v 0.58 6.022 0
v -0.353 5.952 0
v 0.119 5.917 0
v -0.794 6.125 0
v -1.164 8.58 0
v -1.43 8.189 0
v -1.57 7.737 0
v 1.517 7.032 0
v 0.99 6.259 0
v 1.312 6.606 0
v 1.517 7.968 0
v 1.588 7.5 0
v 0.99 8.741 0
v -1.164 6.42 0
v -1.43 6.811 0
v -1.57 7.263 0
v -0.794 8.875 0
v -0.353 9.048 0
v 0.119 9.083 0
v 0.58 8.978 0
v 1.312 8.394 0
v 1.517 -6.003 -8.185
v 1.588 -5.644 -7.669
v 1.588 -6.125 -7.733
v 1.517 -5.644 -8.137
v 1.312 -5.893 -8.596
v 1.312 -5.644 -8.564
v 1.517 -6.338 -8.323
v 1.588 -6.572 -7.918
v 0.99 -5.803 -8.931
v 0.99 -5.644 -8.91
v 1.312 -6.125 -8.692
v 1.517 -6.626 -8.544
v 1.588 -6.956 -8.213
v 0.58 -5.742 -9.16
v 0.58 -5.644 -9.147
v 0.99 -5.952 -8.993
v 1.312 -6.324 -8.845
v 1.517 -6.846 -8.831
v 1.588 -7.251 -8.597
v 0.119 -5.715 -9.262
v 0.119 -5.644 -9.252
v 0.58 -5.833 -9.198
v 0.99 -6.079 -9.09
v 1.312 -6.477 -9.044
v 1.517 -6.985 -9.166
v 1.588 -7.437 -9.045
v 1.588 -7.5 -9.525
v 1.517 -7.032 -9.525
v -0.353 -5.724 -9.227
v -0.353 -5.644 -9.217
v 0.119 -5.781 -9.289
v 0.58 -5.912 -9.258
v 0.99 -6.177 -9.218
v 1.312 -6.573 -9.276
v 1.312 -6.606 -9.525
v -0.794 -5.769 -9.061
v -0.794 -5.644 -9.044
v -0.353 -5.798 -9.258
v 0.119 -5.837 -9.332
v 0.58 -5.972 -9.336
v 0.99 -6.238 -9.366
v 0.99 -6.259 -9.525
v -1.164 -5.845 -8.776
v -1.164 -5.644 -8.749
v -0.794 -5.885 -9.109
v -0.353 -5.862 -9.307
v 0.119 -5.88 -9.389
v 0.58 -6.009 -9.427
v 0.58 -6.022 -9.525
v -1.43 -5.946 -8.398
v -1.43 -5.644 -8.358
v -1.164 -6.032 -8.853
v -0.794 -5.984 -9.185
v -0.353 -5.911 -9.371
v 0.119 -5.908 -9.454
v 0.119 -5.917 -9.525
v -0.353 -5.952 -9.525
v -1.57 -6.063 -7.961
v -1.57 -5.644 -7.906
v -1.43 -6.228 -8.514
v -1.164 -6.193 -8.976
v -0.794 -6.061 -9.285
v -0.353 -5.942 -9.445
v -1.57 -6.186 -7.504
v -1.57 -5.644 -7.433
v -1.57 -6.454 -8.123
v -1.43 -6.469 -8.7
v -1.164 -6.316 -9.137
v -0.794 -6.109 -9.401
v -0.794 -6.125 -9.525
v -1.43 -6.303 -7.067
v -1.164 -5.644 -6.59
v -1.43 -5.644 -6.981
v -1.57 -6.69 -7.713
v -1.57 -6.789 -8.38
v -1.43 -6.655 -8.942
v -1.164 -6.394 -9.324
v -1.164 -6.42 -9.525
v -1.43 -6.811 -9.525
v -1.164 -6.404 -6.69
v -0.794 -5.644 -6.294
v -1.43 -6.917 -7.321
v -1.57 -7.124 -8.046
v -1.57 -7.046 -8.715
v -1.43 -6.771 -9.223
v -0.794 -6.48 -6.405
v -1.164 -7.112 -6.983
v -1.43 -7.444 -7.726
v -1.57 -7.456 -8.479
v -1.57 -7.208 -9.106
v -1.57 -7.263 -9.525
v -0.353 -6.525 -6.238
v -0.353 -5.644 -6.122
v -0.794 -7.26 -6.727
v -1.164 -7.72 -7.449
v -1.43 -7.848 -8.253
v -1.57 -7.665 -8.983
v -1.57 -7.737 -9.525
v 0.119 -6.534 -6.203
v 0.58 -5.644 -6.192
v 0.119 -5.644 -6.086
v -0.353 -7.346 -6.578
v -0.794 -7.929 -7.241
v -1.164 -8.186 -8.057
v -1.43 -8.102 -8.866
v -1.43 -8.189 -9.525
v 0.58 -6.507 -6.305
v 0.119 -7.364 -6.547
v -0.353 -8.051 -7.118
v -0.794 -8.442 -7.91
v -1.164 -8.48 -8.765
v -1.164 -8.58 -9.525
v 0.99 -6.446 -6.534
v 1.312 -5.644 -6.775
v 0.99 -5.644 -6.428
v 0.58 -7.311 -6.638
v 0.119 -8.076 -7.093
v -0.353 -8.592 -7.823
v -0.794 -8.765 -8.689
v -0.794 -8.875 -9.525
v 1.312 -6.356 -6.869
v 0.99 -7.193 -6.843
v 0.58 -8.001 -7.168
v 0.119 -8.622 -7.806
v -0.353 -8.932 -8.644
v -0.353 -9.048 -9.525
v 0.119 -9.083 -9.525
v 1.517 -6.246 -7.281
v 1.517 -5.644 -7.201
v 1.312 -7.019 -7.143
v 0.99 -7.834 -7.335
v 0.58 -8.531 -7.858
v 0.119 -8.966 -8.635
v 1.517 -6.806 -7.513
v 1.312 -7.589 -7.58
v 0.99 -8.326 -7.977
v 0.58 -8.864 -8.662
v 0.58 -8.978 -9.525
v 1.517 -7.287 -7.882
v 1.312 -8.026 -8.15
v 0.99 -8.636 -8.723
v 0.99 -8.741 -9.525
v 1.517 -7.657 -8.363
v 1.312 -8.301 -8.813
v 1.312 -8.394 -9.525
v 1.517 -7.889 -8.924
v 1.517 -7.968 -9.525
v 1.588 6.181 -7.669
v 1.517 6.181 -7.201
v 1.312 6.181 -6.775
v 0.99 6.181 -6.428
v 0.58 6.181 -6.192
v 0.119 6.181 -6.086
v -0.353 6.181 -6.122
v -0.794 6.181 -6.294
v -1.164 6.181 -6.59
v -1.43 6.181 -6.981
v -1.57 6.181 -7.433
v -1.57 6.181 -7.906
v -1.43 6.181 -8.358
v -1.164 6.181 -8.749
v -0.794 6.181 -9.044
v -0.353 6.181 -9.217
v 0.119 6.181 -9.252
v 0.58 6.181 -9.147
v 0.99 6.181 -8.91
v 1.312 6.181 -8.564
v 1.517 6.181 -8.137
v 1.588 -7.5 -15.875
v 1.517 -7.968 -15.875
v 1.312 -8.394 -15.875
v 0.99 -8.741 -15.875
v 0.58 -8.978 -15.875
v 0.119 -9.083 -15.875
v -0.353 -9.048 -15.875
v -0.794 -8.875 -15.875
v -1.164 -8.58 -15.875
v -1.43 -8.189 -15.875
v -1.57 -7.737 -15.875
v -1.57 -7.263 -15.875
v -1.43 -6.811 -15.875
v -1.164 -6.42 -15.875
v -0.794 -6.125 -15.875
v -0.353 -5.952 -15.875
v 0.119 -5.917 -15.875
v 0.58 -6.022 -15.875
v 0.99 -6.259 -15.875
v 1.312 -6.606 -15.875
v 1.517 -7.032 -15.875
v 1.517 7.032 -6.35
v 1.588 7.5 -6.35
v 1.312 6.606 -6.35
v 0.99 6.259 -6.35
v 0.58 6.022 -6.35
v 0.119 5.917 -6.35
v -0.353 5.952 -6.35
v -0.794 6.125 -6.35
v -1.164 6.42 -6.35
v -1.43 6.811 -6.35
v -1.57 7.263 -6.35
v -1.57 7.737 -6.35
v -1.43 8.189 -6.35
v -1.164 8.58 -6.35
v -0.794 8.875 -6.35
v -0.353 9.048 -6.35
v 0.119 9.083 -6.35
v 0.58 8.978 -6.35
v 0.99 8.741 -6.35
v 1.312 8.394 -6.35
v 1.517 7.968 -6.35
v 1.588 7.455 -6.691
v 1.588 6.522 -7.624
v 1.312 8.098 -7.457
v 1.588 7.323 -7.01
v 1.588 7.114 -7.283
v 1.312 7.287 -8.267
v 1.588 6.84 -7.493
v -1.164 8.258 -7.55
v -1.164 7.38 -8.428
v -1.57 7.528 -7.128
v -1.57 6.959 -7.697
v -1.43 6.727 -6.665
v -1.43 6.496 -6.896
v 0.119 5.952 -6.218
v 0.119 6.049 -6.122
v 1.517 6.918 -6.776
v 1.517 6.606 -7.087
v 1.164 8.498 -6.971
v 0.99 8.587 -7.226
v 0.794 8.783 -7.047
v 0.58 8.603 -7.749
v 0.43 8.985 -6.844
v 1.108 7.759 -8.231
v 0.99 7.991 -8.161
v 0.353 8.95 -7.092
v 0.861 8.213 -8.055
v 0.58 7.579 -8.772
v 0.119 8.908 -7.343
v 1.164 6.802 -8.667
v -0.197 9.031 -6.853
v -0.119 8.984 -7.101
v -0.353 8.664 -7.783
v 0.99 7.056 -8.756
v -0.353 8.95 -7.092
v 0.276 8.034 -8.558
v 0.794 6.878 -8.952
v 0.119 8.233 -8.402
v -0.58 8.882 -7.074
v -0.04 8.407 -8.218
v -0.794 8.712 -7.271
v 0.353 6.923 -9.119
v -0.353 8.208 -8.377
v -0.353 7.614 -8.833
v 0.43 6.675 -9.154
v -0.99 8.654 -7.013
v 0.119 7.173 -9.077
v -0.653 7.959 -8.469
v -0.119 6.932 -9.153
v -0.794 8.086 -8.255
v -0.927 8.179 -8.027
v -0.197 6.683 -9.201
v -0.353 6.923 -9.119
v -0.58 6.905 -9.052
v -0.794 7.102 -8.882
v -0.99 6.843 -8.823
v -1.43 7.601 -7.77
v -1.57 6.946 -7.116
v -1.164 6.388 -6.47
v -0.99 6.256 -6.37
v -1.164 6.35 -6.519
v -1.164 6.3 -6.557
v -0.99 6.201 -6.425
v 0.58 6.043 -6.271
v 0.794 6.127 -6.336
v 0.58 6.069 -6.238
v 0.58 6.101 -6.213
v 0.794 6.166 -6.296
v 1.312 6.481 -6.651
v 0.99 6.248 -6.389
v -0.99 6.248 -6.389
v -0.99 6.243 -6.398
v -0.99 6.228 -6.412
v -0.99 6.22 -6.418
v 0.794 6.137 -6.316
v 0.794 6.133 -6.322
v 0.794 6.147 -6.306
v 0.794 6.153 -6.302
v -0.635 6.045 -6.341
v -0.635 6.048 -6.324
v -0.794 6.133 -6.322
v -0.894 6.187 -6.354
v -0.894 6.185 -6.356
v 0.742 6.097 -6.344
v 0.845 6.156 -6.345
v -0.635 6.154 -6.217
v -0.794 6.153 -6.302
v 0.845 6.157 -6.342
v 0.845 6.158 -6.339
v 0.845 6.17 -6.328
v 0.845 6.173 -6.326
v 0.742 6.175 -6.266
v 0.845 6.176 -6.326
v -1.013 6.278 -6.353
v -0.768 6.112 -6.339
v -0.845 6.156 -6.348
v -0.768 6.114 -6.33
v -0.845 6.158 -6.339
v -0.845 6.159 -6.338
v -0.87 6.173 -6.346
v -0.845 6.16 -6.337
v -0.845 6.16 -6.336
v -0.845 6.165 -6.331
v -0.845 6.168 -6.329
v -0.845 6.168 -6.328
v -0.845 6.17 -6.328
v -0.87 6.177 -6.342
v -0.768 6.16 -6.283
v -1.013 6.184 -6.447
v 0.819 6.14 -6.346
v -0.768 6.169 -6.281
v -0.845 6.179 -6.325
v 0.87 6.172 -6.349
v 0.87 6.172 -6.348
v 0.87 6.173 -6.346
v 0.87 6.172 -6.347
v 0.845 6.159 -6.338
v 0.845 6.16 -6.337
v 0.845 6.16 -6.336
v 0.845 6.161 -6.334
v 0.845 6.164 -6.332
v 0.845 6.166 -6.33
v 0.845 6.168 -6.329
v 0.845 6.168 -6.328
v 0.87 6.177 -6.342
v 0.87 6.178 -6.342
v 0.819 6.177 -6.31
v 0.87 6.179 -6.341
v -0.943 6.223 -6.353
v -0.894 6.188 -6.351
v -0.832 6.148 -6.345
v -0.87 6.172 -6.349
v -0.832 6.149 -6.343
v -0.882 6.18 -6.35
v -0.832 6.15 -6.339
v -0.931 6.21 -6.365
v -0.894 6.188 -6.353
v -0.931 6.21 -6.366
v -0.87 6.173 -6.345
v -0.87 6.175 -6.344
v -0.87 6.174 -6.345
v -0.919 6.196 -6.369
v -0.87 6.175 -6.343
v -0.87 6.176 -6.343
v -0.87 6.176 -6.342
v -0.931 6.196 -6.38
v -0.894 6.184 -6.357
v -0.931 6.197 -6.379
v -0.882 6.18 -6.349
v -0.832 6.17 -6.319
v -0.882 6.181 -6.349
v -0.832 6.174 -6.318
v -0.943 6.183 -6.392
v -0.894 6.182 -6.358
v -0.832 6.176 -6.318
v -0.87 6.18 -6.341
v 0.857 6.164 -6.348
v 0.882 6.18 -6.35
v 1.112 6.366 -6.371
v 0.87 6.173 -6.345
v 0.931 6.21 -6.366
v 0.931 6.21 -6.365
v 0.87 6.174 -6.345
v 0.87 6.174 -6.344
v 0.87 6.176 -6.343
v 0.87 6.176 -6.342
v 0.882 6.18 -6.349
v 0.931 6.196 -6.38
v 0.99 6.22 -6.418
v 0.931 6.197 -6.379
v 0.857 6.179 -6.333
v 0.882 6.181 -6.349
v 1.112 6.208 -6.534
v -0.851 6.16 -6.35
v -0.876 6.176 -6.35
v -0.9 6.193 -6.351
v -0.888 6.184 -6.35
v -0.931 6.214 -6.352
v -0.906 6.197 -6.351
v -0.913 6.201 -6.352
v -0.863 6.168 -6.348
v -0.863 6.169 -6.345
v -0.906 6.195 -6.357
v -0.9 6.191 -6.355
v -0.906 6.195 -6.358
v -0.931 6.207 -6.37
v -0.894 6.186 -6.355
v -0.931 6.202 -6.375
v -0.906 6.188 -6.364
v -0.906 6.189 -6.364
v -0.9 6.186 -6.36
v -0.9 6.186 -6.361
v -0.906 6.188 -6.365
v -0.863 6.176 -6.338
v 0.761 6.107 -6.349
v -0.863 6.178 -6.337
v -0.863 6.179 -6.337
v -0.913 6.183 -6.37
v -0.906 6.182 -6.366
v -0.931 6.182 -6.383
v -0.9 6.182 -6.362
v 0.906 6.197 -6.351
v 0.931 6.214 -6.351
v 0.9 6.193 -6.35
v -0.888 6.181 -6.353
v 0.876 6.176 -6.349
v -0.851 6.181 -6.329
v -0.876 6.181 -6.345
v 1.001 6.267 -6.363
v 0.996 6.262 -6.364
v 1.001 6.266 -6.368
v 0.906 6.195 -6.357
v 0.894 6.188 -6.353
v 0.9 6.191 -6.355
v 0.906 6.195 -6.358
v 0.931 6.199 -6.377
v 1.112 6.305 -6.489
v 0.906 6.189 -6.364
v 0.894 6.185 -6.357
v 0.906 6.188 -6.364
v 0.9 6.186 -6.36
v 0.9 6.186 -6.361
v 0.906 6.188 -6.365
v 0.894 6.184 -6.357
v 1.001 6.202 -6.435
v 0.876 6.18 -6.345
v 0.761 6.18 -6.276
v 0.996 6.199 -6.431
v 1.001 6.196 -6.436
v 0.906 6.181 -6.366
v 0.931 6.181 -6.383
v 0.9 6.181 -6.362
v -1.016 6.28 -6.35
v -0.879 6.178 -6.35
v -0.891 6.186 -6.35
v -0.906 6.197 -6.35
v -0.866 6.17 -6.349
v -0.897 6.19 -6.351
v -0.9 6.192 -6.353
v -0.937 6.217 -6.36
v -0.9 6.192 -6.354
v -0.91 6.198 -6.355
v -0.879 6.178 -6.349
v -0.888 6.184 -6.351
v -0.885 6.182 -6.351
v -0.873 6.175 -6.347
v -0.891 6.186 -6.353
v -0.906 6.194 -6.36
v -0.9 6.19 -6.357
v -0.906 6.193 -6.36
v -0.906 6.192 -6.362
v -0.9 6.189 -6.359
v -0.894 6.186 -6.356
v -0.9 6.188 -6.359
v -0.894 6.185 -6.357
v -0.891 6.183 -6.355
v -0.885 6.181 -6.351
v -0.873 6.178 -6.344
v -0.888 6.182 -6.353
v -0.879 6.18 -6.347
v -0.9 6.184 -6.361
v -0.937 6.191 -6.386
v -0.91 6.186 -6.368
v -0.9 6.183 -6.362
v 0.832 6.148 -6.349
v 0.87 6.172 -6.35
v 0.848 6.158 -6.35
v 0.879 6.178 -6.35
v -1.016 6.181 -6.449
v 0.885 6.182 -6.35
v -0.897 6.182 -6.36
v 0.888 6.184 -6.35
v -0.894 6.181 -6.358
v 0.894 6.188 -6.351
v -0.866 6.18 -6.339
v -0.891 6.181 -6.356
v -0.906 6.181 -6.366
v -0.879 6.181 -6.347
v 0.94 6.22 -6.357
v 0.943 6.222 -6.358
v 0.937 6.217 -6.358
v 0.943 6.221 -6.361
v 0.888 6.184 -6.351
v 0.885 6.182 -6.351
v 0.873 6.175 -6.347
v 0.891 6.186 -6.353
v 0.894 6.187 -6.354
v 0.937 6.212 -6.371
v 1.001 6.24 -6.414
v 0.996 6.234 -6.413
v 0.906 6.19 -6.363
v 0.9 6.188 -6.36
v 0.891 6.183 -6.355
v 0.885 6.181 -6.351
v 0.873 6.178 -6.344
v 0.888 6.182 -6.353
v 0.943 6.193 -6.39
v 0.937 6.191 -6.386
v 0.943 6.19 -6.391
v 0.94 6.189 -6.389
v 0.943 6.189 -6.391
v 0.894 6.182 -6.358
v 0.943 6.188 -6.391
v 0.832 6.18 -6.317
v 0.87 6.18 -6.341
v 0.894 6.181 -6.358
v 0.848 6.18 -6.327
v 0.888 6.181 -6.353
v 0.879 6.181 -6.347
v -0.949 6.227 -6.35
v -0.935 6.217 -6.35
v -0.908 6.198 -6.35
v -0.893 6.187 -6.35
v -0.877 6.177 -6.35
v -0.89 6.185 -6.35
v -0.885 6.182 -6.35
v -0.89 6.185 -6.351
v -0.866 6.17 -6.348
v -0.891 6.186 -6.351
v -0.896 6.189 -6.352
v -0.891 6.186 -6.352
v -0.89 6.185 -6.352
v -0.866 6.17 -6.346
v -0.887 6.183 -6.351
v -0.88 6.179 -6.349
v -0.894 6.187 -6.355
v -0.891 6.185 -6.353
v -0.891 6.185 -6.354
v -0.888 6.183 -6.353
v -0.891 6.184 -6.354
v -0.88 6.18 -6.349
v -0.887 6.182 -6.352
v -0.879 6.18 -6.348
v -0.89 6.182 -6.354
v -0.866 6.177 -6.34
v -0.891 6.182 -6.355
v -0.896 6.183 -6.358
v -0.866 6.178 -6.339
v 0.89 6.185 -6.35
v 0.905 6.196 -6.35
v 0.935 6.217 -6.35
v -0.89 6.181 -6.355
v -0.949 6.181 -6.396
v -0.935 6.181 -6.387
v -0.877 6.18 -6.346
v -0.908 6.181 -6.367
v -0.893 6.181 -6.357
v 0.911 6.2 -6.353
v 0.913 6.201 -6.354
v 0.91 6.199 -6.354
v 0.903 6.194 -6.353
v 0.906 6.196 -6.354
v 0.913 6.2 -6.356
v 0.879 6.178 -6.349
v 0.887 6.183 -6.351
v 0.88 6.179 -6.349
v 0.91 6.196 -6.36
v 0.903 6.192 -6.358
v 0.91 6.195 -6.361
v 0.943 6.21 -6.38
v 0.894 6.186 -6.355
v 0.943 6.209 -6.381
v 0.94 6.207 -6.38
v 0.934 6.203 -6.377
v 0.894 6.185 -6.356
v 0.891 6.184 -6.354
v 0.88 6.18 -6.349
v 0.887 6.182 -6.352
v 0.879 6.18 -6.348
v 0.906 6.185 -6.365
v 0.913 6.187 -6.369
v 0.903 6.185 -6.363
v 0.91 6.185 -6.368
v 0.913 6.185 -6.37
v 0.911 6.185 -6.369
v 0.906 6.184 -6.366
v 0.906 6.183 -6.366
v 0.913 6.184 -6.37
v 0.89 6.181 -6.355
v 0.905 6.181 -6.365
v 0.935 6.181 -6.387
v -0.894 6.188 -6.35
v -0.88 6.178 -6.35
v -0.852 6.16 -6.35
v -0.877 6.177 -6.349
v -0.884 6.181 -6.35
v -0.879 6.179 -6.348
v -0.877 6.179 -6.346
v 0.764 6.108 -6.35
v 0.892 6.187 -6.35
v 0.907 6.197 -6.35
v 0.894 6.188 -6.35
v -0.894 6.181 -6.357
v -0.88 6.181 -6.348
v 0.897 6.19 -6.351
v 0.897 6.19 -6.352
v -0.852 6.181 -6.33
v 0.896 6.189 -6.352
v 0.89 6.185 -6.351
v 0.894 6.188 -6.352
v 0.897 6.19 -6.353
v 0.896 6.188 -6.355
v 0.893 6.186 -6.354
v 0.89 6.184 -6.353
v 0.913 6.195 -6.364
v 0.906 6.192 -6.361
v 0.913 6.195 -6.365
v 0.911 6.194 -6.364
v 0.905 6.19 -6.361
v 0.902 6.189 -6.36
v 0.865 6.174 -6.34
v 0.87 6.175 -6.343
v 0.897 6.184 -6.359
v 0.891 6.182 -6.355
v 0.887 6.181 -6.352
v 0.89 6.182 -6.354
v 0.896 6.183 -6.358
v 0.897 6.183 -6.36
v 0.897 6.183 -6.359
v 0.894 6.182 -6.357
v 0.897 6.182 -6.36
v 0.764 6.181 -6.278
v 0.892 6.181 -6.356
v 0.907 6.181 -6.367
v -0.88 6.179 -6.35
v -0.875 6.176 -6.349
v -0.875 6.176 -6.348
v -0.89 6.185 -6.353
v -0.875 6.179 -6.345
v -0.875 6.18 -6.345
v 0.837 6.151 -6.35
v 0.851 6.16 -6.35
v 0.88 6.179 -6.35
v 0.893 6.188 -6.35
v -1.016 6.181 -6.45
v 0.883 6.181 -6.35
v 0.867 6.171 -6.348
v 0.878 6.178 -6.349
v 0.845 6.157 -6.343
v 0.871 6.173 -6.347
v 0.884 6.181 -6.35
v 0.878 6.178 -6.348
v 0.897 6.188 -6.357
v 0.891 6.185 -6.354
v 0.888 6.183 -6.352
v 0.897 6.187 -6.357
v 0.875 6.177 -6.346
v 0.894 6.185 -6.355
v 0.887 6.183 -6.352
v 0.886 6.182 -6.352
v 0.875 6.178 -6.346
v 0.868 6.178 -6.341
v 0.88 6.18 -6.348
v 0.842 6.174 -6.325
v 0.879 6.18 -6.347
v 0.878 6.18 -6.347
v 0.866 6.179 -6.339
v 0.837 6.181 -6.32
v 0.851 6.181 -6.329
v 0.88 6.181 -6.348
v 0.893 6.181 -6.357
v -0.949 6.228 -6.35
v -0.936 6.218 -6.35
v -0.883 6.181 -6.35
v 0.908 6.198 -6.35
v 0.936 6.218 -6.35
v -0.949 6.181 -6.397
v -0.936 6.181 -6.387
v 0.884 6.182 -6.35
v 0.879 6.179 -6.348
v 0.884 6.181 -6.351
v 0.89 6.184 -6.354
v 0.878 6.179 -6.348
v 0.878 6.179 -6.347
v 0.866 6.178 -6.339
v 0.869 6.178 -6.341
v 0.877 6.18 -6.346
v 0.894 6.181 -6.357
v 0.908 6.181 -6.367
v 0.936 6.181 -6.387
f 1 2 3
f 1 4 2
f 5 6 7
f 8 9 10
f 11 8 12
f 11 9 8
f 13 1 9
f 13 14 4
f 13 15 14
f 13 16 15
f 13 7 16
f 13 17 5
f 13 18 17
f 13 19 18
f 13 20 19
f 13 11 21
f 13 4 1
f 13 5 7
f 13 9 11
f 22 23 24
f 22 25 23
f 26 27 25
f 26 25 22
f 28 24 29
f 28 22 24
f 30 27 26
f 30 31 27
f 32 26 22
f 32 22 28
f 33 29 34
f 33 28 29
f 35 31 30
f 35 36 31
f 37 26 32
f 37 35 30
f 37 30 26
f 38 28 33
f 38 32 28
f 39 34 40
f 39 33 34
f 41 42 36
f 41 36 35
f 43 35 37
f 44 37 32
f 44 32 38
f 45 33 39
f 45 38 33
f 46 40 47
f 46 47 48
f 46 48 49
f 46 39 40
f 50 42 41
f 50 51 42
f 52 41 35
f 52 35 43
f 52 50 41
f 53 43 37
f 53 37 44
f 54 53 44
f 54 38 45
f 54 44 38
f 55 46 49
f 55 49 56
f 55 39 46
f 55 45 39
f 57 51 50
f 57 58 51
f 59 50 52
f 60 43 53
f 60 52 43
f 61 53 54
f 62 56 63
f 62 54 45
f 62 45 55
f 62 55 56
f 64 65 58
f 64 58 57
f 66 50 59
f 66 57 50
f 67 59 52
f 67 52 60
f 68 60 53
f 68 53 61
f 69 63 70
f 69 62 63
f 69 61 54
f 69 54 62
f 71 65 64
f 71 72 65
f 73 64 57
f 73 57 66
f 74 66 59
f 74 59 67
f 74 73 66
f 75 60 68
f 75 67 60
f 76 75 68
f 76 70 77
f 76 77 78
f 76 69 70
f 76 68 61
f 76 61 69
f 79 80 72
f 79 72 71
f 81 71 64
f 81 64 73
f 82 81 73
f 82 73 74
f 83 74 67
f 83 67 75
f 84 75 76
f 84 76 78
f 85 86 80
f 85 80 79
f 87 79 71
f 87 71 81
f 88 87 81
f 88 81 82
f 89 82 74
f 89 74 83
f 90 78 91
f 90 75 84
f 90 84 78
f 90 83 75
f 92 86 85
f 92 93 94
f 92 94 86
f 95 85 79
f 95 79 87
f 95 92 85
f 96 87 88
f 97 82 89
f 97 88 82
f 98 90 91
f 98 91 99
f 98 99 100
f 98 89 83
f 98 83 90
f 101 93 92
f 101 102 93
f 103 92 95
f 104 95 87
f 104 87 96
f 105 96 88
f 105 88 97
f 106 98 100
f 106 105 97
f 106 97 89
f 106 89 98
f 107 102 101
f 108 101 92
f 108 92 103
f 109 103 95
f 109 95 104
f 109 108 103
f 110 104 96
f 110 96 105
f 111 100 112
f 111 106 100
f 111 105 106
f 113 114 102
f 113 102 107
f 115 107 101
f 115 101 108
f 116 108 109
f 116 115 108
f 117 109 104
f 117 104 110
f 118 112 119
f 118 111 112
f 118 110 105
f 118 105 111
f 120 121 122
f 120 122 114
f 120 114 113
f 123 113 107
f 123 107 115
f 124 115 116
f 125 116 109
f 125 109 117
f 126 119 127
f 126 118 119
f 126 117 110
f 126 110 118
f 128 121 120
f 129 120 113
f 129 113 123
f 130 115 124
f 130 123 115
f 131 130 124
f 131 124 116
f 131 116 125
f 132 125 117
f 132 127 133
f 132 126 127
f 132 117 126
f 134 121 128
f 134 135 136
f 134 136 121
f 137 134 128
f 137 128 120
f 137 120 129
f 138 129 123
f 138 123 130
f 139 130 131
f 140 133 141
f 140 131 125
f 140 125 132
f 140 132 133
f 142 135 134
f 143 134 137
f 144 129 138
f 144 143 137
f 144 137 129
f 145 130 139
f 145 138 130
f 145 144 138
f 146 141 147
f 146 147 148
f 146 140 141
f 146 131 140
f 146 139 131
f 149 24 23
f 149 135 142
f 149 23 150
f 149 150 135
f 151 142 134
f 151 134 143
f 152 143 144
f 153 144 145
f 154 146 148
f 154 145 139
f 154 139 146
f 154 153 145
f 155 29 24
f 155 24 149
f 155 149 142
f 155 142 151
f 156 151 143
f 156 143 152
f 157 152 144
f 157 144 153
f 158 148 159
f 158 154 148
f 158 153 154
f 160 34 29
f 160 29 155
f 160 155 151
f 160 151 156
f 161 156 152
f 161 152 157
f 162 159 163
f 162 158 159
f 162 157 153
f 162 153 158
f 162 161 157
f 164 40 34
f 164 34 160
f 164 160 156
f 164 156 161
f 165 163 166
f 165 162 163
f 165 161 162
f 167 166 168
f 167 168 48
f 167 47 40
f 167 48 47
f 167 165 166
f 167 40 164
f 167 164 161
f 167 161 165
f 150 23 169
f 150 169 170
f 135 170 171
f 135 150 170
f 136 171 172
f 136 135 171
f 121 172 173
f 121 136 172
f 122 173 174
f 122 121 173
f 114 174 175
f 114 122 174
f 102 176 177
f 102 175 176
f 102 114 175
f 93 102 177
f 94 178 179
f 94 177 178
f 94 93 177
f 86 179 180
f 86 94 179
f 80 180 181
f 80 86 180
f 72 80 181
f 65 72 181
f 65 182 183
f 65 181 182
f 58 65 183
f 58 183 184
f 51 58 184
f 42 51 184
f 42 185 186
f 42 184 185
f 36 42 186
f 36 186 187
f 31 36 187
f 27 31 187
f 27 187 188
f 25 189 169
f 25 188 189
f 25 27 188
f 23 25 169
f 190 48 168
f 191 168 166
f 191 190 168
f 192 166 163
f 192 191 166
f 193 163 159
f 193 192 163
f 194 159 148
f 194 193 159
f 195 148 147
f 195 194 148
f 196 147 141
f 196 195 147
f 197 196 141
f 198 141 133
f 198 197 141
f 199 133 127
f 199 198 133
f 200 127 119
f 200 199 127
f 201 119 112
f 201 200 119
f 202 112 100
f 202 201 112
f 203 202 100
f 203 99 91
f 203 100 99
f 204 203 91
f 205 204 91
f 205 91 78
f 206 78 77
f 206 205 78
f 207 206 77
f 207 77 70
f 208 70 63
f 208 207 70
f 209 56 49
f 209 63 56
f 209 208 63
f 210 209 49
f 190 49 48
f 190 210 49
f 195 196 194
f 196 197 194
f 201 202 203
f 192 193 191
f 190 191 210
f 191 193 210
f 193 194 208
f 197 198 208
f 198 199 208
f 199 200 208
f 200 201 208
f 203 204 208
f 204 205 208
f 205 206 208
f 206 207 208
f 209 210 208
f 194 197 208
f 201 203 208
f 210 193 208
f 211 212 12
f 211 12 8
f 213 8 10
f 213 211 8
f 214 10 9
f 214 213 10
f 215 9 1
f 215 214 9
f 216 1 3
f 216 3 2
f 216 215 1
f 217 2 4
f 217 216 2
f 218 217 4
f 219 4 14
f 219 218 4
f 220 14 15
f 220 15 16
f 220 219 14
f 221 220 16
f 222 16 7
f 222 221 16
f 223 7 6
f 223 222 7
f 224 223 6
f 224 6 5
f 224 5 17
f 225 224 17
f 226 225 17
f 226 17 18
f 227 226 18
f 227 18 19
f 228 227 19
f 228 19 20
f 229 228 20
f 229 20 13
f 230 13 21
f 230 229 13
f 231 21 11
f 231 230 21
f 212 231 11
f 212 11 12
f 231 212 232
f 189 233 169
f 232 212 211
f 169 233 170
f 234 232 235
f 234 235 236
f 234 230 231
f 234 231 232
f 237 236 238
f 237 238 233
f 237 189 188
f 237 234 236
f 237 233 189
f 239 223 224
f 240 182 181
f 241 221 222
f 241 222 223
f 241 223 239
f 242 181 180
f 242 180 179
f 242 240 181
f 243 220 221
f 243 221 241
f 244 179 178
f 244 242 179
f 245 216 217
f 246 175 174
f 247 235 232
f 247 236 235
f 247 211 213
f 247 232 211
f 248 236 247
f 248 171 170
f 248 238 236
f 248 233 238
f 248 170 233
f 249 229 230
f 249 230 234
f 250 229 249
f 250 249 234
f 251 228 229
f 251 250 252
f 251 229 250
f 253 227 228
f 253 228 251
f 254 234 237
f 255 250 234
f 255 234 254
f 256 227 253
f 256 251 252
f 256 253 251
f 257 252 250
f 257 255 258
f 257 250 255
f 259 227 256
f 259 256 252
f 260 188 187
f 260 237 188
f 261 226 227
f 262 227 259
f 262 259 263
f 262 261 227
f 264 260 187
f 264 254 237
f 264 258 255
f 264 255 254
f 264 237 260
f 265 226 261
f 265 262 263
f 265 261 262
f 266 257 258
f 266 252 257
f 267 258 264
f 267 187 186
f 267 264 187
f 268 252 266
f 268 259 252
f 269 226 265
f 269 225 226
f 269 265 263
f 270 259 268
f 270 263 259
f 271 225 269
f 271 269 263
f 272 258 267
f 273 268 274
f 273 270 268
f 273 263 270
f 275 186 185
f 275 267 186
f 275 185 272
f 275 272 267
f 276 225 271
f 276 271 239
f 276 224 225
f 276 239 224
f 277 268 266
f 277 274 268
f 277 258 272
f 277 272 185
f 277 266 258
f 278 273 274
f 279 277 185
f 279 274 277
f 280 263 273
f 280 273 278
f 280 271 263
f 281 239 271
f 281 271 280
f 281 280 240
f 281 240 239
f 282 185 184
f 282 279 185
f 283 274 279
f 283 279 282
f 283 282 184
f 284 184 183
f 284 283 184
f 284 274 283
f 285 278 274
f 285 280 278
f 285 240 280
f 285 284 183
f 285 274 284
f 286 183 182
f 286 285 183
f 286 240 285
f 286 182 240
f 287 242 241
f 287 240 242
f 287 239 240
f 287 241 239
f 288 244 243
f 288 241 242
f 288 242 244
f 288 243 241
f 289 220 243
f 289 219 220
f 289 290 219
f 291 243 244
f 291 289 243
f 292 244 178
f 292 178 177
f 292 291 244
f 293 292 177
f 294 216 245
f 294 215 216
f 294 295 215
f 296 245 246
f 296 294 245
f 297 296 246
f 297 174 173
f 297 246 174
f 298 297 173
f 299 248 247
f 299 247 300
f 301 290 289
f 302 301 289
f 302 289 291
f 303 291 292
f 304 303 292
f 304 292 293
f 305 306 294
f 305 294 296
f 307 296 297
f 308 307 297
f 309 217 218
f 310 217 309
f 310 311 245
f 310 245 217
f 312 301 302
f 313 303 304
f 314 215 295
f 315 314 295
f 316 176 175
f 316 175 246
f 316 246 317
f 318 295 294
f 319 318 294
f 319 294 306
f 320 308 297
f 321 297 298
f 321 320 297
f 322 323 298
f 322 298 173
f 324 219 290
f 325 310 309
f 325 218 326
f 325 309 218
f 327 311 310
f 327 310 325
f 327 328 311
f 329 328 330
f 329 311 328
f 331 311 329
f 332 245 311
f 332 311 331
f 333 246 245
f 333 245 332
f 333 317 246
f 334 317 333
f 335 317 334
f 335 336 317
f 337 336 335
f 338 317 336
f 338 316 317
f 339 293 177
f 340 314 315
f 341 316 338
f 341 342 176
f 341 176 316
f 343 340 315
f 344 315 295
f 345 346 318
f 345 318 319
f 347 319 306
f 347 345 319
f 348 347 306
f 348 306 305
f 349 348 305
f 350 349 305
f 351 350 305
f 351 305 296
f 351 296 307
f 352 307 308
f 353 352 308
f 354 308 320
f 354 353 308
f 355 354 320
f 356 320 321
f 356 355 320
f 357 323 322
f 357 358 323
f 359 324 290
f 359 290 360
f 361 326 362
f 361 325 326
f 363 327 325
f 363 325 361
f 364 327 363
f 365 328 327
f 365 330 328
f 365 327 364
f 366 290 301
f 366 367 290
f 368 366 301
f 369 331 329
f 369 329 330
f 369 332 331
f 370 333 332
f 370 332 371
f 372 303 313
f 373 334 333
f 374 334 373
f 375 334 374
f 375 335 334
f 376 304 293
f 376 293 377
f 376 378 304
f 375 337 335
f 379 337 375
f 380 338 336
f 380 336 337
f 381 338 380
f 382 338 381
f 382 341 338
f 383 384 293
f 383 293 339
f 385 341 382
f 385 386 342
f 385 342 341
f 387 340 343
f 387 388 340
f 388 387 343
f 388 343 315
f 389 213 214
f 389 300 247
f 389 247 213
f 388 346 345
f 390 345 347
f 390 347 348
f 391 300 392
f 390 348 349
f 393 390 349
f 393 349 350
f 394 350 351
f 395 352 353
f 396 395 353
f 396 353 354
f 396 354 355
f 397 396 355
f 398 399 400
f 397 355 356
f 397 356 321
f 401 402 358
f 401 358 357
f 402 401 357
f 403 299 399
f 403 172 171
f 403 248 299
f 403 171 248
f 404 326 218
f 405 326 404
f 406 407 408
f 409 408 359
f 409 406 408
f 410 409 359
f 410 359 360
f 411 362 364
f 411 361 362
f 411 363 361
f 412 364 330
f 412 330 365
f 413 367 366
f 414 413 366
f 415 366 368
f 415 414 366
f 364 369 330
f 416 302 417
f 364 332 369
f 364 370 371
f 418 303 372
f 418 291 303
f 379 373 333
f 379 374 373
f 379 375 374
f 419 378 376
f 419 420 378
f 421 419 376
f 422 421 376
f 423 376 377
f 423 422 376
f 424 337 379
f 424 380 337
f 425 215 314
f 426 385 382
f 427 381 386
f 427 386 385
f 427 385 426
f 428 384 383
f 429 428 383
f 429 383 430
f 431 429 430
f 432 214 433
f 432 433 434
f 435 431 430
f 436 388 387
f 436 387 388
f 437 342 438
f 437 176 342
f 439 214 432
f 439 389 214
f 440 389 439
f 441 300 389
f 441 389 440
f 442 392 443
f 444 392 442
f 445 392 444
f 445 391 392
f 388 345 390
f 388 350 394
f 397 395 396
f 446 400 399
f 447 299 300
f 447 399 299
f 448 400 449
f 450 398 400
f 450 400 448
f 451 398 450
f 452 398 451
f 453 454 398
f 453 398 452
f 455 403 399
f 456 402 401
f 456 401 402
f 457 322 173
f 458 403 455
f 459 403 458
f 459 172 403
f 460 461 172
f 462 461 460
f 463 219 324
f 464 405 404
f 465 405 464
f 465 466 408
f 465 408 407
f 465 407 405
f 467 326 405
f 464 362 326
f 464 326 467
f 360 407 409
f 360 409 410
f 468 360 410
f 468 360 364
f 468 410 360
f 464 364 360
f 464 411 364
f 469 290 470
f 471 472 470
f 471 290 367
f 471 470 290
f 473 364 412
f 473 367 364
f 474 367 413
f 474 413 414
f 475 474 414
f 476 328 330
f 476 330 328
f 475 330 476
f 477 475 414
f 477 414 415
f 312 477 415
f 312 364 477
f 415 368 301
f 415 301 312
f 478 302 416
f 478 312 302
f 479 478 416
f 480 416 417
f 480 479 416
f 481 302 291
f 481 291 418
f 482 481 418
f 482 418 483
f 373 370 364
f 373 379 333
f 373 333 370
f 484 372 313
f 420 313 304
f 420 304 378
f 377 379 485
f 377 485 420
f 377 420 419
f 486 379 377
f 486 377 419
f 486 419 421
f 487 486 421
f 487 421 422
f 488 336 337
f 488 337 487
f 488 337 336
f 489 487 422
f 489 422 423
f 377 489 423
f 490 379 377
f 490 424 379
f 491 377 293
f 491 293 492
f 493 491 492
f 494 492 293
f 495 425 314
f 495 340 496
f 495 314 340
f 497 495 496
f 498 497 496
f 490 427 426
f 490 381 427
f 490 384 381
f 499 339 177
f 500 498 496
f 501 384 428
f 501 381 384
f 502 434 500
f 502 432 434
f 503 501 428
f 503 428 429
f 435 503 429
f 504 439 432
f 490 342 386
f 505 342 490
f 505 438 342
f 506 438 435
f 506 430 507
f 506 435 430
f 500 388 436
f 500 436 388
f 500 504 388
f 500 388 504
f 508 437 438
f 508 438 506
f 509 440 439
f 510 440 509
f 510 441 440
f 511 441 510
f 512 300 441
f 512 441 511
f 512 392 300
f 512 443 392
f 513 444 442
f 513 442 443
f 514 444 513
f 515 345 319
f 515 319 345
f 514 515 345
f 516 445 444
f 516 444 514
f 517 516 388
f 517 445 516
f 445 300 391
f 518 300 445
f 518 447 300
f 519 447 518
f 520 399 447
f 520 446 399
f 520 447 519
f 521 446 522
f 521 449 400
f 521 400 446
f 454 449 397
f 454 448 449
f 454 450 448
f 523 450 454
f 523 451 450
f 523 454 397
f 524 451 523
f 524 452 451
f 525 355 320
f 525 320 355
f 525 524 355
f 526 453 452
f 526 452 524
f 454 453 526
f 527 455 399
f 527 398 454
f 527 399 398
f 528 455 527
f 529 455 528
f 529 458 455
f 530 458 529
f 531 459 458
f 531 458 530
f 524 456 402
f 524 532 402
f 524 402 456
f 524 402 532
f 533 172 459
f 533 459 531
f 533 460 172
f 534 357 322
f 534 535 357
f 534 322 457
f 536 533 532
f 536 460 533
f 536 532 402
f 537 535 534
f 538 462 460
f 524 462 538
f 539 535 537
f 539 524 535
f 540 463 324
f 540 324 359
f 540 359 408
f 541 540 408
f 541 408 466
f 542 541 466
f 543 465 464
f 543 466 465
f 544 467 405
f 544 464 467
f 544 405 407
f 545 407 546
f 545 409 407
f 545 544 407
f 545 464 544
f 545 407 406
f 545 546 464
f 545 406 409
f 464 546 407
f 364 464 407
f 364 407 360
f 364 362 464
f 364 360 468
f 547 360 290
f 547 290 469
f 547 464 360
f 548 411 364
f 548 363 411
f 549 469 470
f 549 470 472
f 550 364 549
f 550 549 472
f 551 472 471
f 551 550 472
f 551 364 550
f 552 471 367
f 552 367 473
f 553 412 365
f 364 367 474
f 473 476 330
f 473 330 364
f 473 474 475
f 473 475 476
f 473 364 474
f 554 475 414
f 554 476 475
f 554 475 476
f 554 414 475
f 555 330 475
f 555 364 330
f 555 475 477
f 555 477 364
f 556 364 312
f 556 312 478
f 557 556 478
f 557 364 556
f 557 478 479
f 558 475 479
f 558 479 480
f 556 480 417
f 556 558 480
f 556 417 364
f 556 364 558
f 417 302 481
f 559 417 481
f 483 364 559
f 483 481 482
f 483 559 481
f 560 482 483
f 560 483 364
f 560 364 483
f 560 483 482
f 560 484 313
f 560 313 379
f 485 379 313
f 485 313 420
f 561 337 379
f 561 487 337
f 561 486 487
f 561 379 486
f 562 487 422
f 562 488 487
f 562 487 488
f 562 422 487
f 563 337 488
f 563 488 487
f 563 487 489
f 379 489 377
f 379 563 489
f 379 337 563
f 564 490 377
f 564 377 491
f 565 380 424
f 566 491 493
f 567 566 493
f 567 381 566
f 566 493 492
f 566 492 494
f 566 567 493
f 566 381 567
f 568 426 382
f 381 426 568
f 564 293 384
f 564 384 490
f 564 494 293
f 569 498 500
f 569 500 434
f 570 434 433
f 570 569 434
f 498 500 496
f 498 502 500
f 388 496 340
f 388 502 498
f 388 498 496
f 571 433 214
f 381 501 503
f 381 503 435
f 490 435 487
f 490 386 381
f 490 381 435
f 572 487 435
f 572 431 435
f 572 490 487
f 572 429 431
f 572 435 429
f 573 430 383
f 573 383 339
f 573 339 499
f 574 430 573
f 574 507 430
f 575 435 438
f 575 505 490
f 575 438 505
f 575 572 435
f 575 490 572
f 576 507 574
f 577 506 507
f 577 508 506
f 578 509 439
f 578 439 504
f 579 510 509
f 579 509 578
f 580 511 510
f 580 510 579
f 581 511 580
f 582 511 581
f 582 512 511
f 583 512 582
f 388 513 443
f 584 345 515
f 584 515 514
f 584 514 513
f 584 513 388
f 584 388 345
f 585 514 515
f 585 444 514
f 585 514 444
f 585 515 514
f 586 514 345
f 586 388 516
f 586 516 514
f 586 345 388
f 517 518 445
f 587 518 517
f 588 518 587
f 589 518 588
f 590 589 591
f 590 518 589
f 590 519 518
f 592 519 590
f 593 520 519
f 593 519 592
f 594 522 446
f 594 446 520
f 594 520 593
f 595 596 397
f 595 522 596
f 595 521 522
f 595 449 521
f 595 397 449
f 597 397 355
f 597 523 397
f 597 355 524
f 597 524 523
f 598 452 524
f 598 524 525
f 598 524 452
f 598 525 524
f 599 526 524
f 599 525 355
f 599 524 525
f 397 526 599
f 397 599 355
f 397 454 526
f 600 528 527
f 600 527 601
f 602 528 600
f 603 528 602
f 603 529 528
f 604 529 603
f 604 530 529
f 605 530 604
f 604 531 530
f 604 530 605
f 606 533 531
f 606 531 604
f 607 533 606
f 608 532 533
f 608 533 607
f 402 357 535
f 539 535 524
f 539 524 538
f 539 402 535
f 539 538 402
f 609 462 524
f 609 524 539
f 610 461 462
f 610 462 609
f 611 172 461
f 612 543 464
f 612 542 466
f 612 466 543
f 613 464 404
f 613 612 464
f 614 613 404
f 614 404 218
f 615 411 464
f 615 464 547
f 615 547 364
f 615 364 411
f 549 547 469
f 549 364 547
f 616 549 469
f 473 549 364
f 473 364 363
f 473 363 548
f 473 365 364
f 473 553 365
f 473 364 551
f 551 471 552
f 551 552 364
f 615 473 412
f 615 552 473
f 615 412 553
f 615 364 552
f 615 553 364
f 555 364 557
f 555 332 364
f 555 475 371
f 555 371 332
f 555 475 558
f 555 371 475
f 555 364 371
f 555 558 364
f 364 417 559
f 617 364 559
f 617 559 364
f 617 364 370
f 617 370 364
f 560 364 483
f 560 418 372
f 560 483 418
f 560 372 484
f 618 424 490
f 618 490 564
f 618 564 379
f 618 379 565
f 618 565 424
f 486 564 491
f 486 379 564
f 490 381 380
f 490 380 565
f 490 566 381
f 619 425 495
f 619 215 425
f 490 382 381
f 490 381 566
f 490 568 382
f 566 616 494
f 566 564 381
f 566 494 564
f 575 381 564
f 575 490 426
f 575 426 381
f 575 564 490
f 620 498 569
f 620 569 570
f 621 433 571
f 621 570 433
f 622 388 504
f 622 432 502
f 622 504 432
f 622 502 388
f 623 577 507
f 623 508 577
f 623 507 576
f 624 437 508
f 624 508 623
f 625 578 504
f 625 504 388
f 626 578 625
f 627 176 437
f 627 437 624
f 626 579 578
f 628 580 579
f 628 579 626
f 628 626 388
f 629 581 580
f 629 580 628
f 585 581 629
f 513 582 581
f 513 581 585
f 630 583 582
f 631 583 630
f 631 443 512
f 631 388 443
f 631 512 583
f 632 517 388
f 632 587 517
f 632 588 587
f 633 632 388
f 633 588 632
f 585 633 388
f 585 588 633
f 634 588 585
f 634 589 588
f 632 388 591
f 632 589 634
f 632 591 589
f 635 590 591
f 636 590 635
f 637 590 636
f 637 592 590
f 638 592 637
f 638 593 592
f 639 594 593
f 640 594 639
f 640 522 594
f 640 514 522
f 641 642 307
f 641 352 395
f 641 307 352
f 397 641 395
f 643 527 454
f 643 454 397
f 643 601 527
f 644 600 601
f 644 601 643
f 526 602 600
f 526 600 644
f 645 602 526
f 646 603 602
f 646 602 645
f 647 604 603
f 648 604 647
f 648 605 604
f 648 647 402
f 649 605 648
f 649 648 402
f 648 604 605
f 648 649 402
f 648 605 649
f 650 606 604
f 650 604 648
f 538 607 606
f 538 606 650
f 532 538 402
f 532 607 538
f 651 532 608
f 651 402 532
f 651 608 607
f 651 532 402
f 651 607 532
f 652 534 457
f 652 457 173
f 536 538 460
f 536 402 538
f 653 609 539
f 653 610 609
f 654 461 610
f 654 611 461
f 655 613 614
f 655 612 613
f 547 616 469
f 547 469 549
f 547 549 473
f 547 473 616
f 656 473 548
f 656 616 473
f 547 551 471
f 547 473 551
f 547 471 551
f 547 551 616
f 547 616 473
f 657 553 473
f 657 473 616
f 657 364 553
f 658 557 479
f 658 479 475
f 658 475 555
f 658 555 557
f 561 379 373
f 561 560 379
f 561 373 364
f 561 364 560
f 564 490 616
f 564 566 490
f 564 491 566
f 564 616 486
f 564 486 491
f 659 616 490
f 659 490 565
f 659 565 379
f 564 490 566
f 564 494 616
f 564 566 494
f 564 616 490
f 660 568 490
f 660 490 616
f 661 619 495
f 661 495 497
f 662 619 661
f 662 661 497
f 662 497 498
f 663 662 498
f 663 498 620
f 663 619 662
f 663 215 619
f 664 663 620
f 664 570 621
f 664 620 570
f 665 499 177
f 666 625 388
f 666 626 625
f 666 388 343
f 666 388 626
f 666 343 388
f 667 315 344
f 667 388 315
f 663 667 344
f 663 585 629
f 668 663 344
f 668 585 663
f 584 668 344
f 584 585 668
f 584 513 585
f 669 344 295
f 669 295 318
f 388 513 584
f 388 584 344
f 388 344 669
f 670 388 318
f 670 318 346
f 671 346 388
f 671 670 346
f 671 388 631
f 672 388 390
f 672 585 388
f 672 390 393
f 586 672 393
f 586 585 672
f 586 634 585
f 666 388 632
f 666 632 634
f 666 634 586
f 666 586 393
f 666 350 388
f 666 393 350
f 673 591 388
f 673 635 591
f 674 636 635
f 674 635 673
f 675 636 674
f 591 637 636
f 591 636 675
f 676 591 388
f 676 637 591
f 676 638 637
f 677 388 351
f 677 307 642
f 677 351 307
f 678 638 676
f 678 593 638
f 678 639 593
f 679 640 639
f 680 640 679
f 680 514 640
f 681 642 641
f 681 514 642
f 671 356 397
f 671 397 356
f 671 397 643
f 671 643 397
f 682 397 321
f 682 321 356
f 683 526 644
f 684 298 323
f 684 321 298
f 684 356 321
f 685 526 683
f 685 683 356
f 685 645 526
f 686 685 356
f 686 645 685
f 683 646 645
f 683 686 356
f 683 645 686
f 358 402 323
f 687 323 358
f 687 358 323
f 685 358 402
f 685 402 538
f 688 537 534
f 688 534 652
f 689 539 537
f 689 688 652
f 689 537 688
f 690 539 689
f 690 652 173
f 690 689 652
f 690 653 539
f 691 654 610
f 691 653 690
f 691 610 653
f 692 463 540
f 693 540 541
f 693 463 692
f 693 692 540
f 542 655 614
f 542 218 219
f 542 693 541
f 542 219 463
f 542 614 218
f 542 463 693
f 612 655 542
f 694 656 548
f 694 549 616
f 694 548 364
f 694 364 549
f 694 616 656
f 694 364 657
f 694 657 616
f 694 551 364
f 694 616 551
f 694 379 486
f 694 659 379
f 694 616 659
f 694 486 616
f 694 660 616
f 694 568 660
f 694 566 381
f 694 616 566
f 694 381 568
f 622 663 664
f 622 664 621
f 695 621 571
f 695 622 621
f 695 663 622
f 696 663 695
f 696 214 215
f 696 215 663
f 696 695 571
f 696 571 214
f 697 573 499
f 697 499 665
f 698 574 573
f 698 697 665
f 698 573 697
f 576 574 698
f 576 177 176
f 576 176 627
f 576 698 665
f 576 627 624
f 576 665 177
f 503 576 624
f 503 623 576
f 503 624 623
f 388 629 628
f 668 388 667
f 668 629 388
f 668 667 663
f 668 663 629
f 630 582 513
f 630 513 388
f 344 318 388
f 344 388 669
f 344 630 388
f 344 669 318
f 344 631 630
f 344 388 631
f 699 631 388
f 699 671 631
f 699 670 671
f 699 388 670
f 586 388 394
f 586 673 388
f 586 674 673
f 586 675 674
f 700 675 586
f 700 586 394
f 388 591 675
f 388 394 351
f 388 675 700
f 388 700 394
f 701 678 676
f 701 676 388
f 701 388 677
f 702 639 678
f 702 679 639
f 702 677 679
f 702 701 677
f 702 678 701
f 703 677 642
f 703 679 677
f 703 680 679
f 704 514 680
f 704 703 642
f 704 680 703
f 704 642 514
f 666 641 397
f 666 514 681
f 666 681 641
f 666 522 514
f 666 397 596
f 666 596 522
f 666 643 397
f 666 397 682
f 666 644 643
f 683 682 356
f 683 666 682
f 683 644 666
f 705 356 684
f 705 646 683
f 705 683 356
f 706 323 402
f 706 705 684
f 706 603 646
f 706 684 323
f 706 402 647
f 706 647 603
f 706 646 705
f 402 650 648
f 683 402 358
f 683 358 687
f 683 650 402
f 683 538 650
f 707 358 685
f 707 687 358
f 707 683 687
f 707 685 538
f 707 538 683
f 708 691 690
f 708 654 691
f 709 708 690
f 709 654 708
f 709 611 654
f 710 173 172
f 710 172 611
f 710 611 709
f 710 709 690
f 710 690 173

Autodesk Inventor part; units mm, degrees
ref_plane "YZ Plane" through (0, 0, 0) normal (1, 0, 0) x (0, 1, 0)
ref_plane "XZ Plane" through (0, 0, 0) normal (0, 1, 0) x (-1, 0, 0)
ref_plane "XY Plane" through (0, 0, 0) normal (0, 0, 1) x (1, 0, 0)
sketch "Sketch3" plane through (0, 0, 0) normal (0, 0, 1) x (1, 0, 0)
  circle A0 centre (0, 7.5) radius 1.5875
  point P0 (0, 0)
  dimension "d10" = 3.175
  dimension "d11" = 7.5
sketch "Sketch4" plane through (0, 0, 0) normal (1, 0, 0) x (0, 1, 0)
  line L0 (7.7682, 0) -> (7.7682, -6.35)
  line L1 (7.7682, 0) -> (14.1182, 0) construction
  line L2 (6.1807, -7.9375) -> (-5.6443, -7.9375)
  line L3 (-7.2318, -9.525) -> (-7.2318, -15.875)
  arc A0 (6.1807, -7.9375) -> (7.7682, -6.35) centre (6.1807, -6.35) ccw
  arc A1 (-5.6443, -7.9375) -> (-7.2318, -9.525) centre (-5.6443, -9.525) ccw
  point P0 (0, 0)
  point P1 (7.7682, -7.9375)
  point P2 (-7.2318, -7.9375)
  dimension "d12" = 7.9375
  dimension "d13" = 90
  dimension "d14" = 15
  dimension "d15" = 90
  dimension "d16" = 7.9375
  dimension "d17" = 1.5875
sweep "Sweep2" add profiles "Sketch3" path "Sketch4"
properties part number "crank bar" material "ABS Plastic"
